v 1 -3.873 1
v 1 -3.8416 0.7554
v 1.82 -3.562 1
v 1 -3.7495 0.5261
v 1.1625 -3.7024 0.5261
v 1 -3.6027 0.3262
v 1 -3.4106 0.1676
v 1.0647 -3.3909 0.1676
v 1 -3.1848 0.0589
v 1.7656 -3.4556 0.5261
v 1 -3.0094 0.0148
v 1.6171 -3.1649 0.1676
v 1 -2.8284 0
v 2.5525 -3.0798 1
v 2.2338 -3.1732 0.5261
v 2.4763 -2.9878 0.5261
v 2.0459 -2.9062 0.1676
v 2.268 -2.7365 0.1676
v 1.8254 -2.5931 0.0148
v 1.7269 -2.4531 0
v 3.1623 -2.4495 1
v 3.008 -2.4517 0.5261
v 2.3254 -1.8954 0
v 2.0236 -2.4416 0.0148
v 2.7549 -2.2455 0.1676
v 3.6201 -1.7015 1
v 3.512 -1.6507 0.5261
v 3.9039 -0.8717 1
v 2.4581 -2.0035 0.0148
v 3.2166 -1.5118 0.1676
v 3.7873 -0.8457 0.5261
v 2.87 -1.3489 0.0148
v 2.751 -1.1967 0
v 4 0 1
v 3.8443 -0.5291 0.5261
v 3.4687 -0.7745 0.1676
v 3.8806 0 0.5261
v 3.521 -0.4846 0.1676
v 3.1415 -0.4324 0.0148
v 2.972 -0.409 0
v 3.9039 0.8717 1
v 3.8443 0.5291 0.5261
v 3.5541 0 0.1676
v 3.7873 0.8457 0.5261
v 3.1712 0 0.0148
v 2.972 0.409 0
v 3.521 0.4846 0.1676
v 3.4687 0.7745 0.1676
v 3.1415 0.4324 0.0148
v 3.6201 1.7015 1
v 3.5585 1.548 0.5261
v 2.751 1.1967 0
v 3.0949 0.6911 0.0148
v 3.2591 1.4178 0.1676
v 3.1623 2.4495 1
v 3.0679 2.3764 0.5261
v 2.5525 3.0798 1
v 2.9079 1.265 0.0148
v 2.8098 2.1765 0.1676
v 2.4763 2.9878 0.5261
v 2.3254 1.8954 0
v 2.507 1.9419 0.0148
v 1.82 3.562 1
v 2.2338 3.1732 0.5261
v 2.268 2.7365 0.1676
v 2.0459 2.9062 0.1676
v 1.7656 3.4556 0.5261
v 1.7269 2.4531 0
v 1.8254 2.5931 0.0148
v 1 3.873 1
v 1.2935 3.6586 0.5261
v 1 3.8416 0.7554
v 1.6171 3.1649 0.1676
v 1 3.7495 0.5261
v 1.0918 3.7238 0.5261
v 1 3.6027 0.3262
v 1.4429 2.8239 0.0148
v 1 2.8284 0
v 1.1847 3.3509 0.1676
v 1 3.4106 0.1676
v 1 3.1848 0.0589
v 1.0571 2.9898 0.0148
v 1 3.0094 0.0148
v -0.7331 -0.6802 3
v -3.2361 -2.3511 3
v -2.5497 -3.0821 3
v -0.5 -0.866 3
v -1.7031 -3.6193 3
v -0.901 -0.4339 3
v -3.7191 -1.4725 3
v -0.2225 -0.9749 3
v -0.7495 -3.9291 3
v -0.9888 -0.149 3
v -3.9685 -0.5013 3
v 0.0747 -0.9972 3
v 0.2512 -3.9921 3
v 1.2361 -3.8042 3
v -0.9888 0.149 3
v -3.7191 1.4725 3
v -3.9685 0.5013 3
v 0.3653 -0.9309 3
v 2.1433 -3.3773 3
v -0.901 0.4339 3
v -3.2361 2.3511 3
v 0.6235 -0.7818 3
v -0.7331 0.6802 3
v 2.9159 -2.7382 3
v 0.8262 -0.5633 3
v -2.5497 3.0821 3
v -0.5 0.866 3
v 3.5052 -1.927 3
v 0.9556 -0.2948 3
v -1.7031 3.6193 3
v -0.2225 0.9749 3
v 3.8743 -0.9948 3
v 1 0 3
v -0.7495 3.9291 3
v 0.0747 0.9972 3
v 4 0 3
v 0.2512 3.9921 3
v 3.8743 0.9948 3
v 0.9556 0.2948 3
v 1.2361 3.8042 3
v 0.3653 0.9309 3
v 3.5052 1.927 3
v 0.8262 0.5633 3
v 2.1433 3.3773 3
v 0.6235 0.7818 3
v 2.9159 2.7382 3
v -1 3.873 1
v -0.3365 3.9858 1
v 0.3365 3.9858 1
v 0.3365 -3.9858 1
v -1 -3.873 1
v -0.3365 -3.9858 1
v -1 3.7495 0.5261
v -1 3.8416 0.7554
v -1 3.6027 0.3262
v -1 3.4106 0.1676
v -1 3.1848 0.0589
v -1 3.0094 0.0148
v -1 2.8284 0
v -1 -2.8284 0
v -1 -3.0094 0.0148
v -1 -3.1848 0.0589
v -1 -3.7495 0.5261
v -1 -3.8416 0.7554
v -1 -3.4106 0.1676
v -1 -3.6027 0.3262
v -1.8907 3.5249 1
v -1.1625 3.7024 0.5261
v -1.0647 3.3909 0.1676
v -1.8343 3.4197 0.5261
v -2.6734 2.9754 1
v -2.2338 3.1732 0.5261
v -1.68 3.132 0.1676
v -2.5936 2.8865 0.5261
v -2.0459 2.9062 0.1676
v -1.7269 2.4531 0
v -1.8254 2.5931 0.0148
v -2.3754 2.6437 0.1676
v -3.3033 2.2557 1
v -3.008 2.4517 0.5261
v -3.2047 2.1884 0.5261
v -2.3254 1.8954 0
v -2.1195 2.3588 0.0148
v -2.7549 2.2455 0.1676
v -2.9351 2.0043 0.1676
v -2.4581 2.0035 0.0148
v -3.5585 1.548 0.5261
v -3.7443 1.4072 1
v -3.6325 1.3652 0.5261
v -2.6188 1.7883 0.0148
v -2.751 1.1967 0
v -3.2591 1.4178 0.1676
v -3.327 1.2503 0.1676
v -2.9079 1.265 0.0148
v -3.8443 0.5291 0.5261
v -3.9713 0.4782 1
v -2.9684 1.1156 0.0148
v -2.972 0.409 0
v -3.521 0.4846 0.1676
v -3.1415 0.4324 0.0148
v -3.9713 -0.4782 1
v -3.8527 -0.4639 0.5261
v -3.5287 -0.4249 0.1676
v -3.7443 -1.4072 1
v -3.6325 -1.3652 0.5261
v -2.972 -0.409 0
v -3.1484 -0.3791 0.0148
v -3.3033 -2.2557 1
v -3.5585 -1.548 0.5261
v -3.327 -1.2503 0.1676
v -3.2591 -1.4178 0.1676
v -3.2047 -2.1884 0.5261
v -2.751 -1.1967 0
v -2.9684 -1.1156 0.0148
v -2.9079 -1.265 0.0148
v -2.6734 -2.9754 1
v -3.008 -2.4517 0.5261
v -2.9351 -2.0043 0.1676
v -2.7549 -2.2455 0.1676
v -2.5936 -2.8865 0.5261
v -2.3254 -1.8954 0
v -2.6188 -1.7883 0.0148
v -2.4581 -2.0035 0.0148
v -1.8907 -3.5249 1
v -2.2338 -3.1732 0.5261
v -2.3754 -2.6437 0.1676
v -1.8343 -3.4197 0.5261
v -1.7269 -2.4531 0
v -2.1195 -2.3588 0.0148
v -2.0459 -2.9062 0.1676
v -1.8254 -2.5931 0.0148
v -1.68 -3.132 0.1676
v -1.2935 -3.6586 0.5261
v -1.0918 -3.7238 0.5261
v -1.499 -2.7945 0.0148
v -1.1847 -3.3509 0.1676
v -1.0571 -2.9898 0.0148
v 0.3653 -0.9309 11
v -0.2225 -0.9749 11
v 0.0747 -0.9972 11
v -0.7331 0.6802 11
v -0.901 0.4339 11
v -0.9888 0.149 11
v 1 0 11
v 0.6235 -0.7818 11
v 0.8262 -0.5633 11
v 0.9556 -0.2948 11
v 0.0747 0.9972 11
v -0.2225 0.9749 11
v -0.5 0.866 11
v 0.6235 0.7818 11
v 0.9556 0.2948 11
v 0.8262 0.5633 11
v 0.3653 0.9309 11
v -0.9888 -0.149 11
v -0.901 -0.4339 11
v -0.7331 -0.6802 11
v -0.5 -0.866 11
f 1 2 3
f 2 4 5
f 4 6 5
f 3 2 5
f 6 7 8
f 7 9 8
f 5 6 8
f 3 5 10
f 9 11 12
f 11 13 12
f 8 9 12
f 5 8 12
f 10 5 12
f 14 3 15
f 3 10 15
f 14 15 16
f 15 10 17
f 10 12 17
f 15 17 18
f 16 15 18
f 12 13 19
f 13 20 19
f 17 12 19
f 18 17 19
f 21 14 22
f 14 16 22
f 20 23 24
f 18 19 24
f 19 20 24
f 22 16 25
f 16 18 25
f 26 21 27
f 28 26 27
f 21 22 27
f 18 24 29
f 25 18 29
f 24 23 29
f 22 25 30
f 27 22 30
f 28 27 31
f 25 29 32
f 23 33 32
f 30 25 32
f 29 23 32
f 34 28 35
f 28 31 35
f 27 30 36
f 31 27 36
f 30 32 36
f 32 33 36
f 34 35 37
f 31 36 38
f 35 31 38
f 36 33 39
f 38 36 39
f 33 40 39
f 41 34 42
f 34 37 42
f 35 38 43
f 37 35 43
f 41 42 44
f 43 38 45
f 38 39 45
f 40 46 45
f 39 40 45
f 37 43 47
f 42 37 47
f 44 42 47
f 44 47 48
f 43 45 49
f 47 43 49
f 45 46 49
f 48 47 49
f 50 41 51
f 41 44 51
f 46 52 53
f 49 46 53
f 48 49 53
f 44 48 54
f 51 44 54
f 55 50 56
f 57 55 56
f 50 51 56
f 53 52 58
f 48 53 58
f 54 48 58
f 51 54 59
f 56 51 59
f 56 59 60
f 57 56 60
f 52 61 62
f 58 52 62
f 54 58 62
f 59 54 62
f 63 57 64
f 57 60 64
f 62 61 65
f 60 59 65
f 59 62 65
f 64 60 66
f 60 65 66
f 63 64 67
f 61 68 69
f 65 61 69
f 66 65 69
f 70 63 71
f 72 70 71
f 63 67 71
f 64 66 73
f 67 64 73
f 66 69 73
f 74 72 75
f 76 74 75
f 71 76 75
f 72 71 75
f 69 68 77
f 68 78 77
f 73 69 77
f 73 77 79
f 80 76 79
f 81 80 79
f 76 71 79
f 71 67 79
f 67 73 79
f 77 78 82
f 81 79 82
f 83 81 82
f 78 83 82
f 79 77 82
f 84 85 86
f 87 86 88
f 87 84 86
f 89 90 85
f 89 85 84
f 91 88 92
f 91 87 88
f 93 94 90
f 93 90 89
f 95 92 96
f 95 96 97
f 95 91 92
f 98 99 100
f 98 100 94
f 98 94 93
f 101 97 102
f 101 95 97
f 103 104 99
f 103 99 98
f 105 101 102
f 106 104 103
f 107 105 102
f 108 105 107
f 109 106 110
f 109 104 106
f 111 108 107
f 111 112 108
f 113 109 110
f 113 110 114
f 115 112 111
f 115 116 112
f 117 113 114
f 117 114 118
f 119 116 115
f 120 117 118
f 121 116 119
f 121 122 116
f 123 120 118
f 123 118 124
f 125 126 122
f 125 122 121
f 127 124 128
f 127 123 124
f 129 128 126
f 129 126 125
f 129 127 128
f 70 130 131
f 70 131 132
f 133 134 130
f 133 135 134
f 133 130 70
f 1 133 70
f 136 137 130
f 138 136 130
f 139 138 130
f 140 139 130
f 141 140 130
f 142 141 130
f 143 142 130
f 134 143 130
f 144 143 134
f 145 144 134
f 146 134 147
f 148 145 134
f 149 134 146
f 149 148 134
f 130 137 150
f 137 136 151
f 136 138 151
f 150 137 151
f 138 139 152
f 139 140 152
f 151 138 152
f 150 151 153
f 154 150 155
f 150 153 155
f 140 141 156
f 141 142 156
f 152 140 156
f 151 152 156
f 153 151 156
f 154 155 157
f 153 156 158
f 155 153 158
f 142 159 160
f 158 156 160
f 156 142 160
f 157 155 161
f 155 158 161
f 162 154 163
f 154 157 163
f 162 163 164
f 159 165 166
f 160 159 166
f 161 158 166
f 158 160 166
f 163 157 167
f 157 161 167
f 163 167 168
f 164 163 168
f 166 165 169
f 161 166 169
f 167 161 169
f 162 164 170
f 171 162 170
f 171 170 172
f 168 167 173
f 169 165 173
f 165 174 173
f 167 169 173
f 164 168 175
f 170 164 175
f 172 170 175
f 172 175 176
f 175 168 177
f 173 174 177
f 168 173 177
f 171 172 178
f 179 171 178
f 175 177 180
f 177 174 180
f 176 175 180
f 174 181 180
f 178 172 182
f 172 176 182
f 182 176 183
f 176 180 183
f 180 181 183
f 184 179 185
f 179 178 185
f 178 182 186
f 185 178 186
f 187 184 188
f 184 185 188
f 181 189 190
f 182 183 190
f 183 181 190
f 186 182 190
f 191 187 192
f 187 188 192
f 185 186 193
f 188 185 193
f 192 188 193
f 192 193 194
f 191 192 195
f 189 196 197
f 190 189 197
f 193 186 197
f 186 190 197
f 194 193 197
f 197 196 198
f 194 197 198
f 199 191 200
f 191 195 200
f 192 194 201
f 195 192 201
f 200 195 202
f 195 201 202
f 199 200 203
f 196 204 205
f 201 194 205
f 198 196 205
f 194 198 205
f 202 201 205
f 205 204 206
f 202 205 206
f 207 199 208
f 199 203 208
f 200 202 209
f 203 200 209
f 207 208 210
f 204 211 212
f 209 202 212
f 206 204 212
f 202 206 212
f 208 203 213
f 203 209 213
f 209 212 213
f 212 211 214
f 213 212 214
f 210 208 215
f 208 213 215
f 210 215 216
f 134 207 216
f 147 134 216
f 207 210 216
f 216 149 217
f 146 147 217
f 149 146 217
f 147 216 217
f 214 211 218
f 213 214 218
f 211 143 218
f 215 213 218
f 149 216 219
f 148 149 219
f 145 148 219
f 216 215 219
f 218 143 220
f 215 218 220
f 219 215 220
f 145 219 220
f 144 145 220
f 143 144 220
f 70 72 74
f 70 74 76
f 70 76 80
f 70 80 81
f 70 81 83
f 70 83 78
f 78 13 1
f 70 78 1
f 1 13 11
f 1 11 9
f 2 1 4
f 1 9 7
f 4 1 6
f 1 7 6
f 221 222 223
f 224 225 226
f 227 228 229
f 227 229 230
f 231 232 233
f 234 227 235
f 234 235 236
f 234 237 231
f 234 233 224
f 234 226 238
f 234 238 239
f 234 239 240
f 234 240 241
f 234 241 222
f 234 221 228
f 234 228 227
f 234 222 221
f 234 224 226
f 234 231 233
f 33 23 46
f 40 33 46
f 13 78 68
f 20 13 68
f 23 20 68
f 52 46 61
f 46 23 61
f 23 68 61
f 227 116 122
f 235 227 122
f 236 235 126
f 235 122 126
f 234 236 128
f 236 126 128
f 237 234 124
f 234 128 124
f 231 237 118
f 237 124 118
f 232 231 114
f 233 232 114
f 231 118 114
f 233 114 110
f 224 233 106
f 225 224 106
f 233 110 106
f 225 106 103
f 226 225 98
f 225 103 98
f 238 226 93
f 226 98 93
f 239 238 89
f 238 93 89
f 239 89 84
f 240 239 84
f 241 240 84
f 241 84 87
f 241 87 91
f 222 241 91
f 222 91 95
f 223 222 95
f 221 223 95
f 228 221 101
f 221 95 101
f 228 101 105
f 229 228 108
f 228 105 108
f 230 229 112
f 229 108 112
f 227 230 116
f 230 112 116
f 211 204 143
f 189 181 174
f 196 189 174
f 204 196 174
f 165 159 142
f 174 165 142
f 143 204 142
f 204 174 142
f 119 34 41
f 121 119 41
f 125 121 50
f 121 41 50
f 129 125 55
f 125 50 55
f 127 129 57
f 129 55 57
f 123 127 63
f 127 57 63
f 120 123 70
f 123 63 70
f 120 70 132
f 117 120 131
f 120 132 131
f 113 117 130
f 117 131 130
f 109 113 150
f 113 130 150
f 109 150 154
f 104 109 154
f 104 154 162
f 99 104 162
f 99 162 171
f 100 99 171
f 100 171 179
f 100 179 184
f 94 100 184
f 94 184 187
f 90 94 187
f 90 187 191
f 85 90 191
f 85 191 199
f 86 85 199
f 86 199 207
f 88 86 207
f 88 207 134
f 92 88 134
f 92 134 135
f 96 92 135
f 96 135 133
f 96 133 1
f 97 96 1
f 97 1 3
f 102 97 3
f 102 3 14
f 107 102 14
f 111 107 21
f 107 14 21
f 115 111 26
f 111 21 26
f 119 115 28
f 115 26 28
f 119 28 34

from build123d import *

# Parameters (mm, degrees)
F0_R     = 4
F1_DEPTH = 3
F2_R     = 1
F3_DEPTH = 8
F4_W     = 2
F4_H     = 10.9652710235
F5_DEPTH = 1
F6_R     = 1


with BuildPart() as f1:
    # F0 (on Top) → F1 (new body)
    with BuildSketch(Plane.XY):
        Circle(F0_R)
    extrude(amount=F1_DEPTH)

    # F2 (on face) → F3 (join)
    with BuildSketch(Plane.XY.offset(3)):
        Circle(F2_R)
    extrude(amount=F3_DEPTH)

    # F4 (on face) → F5 (cut)
    with BuildSketch(Plane(origin=(0, 0, 0), x_dir=(1, 0, 0), z_dir=(0, 0, -1))):
        Rectangle(F4_W, F4_H)
    extrude(amount=-F5_DEPTH, mode=Mode.SUBTRACT)

    # F6
    f6_edges = [f1.edges().sort_by_distance(p)[0] for p in [
        (-4, 0, 0),
        (3.162278, 2.44949, 0),
        (3.162278, -2.44949, 0),
    ]]
    fillet(f6_edges, radius=F6_R)


solid = f1.part
